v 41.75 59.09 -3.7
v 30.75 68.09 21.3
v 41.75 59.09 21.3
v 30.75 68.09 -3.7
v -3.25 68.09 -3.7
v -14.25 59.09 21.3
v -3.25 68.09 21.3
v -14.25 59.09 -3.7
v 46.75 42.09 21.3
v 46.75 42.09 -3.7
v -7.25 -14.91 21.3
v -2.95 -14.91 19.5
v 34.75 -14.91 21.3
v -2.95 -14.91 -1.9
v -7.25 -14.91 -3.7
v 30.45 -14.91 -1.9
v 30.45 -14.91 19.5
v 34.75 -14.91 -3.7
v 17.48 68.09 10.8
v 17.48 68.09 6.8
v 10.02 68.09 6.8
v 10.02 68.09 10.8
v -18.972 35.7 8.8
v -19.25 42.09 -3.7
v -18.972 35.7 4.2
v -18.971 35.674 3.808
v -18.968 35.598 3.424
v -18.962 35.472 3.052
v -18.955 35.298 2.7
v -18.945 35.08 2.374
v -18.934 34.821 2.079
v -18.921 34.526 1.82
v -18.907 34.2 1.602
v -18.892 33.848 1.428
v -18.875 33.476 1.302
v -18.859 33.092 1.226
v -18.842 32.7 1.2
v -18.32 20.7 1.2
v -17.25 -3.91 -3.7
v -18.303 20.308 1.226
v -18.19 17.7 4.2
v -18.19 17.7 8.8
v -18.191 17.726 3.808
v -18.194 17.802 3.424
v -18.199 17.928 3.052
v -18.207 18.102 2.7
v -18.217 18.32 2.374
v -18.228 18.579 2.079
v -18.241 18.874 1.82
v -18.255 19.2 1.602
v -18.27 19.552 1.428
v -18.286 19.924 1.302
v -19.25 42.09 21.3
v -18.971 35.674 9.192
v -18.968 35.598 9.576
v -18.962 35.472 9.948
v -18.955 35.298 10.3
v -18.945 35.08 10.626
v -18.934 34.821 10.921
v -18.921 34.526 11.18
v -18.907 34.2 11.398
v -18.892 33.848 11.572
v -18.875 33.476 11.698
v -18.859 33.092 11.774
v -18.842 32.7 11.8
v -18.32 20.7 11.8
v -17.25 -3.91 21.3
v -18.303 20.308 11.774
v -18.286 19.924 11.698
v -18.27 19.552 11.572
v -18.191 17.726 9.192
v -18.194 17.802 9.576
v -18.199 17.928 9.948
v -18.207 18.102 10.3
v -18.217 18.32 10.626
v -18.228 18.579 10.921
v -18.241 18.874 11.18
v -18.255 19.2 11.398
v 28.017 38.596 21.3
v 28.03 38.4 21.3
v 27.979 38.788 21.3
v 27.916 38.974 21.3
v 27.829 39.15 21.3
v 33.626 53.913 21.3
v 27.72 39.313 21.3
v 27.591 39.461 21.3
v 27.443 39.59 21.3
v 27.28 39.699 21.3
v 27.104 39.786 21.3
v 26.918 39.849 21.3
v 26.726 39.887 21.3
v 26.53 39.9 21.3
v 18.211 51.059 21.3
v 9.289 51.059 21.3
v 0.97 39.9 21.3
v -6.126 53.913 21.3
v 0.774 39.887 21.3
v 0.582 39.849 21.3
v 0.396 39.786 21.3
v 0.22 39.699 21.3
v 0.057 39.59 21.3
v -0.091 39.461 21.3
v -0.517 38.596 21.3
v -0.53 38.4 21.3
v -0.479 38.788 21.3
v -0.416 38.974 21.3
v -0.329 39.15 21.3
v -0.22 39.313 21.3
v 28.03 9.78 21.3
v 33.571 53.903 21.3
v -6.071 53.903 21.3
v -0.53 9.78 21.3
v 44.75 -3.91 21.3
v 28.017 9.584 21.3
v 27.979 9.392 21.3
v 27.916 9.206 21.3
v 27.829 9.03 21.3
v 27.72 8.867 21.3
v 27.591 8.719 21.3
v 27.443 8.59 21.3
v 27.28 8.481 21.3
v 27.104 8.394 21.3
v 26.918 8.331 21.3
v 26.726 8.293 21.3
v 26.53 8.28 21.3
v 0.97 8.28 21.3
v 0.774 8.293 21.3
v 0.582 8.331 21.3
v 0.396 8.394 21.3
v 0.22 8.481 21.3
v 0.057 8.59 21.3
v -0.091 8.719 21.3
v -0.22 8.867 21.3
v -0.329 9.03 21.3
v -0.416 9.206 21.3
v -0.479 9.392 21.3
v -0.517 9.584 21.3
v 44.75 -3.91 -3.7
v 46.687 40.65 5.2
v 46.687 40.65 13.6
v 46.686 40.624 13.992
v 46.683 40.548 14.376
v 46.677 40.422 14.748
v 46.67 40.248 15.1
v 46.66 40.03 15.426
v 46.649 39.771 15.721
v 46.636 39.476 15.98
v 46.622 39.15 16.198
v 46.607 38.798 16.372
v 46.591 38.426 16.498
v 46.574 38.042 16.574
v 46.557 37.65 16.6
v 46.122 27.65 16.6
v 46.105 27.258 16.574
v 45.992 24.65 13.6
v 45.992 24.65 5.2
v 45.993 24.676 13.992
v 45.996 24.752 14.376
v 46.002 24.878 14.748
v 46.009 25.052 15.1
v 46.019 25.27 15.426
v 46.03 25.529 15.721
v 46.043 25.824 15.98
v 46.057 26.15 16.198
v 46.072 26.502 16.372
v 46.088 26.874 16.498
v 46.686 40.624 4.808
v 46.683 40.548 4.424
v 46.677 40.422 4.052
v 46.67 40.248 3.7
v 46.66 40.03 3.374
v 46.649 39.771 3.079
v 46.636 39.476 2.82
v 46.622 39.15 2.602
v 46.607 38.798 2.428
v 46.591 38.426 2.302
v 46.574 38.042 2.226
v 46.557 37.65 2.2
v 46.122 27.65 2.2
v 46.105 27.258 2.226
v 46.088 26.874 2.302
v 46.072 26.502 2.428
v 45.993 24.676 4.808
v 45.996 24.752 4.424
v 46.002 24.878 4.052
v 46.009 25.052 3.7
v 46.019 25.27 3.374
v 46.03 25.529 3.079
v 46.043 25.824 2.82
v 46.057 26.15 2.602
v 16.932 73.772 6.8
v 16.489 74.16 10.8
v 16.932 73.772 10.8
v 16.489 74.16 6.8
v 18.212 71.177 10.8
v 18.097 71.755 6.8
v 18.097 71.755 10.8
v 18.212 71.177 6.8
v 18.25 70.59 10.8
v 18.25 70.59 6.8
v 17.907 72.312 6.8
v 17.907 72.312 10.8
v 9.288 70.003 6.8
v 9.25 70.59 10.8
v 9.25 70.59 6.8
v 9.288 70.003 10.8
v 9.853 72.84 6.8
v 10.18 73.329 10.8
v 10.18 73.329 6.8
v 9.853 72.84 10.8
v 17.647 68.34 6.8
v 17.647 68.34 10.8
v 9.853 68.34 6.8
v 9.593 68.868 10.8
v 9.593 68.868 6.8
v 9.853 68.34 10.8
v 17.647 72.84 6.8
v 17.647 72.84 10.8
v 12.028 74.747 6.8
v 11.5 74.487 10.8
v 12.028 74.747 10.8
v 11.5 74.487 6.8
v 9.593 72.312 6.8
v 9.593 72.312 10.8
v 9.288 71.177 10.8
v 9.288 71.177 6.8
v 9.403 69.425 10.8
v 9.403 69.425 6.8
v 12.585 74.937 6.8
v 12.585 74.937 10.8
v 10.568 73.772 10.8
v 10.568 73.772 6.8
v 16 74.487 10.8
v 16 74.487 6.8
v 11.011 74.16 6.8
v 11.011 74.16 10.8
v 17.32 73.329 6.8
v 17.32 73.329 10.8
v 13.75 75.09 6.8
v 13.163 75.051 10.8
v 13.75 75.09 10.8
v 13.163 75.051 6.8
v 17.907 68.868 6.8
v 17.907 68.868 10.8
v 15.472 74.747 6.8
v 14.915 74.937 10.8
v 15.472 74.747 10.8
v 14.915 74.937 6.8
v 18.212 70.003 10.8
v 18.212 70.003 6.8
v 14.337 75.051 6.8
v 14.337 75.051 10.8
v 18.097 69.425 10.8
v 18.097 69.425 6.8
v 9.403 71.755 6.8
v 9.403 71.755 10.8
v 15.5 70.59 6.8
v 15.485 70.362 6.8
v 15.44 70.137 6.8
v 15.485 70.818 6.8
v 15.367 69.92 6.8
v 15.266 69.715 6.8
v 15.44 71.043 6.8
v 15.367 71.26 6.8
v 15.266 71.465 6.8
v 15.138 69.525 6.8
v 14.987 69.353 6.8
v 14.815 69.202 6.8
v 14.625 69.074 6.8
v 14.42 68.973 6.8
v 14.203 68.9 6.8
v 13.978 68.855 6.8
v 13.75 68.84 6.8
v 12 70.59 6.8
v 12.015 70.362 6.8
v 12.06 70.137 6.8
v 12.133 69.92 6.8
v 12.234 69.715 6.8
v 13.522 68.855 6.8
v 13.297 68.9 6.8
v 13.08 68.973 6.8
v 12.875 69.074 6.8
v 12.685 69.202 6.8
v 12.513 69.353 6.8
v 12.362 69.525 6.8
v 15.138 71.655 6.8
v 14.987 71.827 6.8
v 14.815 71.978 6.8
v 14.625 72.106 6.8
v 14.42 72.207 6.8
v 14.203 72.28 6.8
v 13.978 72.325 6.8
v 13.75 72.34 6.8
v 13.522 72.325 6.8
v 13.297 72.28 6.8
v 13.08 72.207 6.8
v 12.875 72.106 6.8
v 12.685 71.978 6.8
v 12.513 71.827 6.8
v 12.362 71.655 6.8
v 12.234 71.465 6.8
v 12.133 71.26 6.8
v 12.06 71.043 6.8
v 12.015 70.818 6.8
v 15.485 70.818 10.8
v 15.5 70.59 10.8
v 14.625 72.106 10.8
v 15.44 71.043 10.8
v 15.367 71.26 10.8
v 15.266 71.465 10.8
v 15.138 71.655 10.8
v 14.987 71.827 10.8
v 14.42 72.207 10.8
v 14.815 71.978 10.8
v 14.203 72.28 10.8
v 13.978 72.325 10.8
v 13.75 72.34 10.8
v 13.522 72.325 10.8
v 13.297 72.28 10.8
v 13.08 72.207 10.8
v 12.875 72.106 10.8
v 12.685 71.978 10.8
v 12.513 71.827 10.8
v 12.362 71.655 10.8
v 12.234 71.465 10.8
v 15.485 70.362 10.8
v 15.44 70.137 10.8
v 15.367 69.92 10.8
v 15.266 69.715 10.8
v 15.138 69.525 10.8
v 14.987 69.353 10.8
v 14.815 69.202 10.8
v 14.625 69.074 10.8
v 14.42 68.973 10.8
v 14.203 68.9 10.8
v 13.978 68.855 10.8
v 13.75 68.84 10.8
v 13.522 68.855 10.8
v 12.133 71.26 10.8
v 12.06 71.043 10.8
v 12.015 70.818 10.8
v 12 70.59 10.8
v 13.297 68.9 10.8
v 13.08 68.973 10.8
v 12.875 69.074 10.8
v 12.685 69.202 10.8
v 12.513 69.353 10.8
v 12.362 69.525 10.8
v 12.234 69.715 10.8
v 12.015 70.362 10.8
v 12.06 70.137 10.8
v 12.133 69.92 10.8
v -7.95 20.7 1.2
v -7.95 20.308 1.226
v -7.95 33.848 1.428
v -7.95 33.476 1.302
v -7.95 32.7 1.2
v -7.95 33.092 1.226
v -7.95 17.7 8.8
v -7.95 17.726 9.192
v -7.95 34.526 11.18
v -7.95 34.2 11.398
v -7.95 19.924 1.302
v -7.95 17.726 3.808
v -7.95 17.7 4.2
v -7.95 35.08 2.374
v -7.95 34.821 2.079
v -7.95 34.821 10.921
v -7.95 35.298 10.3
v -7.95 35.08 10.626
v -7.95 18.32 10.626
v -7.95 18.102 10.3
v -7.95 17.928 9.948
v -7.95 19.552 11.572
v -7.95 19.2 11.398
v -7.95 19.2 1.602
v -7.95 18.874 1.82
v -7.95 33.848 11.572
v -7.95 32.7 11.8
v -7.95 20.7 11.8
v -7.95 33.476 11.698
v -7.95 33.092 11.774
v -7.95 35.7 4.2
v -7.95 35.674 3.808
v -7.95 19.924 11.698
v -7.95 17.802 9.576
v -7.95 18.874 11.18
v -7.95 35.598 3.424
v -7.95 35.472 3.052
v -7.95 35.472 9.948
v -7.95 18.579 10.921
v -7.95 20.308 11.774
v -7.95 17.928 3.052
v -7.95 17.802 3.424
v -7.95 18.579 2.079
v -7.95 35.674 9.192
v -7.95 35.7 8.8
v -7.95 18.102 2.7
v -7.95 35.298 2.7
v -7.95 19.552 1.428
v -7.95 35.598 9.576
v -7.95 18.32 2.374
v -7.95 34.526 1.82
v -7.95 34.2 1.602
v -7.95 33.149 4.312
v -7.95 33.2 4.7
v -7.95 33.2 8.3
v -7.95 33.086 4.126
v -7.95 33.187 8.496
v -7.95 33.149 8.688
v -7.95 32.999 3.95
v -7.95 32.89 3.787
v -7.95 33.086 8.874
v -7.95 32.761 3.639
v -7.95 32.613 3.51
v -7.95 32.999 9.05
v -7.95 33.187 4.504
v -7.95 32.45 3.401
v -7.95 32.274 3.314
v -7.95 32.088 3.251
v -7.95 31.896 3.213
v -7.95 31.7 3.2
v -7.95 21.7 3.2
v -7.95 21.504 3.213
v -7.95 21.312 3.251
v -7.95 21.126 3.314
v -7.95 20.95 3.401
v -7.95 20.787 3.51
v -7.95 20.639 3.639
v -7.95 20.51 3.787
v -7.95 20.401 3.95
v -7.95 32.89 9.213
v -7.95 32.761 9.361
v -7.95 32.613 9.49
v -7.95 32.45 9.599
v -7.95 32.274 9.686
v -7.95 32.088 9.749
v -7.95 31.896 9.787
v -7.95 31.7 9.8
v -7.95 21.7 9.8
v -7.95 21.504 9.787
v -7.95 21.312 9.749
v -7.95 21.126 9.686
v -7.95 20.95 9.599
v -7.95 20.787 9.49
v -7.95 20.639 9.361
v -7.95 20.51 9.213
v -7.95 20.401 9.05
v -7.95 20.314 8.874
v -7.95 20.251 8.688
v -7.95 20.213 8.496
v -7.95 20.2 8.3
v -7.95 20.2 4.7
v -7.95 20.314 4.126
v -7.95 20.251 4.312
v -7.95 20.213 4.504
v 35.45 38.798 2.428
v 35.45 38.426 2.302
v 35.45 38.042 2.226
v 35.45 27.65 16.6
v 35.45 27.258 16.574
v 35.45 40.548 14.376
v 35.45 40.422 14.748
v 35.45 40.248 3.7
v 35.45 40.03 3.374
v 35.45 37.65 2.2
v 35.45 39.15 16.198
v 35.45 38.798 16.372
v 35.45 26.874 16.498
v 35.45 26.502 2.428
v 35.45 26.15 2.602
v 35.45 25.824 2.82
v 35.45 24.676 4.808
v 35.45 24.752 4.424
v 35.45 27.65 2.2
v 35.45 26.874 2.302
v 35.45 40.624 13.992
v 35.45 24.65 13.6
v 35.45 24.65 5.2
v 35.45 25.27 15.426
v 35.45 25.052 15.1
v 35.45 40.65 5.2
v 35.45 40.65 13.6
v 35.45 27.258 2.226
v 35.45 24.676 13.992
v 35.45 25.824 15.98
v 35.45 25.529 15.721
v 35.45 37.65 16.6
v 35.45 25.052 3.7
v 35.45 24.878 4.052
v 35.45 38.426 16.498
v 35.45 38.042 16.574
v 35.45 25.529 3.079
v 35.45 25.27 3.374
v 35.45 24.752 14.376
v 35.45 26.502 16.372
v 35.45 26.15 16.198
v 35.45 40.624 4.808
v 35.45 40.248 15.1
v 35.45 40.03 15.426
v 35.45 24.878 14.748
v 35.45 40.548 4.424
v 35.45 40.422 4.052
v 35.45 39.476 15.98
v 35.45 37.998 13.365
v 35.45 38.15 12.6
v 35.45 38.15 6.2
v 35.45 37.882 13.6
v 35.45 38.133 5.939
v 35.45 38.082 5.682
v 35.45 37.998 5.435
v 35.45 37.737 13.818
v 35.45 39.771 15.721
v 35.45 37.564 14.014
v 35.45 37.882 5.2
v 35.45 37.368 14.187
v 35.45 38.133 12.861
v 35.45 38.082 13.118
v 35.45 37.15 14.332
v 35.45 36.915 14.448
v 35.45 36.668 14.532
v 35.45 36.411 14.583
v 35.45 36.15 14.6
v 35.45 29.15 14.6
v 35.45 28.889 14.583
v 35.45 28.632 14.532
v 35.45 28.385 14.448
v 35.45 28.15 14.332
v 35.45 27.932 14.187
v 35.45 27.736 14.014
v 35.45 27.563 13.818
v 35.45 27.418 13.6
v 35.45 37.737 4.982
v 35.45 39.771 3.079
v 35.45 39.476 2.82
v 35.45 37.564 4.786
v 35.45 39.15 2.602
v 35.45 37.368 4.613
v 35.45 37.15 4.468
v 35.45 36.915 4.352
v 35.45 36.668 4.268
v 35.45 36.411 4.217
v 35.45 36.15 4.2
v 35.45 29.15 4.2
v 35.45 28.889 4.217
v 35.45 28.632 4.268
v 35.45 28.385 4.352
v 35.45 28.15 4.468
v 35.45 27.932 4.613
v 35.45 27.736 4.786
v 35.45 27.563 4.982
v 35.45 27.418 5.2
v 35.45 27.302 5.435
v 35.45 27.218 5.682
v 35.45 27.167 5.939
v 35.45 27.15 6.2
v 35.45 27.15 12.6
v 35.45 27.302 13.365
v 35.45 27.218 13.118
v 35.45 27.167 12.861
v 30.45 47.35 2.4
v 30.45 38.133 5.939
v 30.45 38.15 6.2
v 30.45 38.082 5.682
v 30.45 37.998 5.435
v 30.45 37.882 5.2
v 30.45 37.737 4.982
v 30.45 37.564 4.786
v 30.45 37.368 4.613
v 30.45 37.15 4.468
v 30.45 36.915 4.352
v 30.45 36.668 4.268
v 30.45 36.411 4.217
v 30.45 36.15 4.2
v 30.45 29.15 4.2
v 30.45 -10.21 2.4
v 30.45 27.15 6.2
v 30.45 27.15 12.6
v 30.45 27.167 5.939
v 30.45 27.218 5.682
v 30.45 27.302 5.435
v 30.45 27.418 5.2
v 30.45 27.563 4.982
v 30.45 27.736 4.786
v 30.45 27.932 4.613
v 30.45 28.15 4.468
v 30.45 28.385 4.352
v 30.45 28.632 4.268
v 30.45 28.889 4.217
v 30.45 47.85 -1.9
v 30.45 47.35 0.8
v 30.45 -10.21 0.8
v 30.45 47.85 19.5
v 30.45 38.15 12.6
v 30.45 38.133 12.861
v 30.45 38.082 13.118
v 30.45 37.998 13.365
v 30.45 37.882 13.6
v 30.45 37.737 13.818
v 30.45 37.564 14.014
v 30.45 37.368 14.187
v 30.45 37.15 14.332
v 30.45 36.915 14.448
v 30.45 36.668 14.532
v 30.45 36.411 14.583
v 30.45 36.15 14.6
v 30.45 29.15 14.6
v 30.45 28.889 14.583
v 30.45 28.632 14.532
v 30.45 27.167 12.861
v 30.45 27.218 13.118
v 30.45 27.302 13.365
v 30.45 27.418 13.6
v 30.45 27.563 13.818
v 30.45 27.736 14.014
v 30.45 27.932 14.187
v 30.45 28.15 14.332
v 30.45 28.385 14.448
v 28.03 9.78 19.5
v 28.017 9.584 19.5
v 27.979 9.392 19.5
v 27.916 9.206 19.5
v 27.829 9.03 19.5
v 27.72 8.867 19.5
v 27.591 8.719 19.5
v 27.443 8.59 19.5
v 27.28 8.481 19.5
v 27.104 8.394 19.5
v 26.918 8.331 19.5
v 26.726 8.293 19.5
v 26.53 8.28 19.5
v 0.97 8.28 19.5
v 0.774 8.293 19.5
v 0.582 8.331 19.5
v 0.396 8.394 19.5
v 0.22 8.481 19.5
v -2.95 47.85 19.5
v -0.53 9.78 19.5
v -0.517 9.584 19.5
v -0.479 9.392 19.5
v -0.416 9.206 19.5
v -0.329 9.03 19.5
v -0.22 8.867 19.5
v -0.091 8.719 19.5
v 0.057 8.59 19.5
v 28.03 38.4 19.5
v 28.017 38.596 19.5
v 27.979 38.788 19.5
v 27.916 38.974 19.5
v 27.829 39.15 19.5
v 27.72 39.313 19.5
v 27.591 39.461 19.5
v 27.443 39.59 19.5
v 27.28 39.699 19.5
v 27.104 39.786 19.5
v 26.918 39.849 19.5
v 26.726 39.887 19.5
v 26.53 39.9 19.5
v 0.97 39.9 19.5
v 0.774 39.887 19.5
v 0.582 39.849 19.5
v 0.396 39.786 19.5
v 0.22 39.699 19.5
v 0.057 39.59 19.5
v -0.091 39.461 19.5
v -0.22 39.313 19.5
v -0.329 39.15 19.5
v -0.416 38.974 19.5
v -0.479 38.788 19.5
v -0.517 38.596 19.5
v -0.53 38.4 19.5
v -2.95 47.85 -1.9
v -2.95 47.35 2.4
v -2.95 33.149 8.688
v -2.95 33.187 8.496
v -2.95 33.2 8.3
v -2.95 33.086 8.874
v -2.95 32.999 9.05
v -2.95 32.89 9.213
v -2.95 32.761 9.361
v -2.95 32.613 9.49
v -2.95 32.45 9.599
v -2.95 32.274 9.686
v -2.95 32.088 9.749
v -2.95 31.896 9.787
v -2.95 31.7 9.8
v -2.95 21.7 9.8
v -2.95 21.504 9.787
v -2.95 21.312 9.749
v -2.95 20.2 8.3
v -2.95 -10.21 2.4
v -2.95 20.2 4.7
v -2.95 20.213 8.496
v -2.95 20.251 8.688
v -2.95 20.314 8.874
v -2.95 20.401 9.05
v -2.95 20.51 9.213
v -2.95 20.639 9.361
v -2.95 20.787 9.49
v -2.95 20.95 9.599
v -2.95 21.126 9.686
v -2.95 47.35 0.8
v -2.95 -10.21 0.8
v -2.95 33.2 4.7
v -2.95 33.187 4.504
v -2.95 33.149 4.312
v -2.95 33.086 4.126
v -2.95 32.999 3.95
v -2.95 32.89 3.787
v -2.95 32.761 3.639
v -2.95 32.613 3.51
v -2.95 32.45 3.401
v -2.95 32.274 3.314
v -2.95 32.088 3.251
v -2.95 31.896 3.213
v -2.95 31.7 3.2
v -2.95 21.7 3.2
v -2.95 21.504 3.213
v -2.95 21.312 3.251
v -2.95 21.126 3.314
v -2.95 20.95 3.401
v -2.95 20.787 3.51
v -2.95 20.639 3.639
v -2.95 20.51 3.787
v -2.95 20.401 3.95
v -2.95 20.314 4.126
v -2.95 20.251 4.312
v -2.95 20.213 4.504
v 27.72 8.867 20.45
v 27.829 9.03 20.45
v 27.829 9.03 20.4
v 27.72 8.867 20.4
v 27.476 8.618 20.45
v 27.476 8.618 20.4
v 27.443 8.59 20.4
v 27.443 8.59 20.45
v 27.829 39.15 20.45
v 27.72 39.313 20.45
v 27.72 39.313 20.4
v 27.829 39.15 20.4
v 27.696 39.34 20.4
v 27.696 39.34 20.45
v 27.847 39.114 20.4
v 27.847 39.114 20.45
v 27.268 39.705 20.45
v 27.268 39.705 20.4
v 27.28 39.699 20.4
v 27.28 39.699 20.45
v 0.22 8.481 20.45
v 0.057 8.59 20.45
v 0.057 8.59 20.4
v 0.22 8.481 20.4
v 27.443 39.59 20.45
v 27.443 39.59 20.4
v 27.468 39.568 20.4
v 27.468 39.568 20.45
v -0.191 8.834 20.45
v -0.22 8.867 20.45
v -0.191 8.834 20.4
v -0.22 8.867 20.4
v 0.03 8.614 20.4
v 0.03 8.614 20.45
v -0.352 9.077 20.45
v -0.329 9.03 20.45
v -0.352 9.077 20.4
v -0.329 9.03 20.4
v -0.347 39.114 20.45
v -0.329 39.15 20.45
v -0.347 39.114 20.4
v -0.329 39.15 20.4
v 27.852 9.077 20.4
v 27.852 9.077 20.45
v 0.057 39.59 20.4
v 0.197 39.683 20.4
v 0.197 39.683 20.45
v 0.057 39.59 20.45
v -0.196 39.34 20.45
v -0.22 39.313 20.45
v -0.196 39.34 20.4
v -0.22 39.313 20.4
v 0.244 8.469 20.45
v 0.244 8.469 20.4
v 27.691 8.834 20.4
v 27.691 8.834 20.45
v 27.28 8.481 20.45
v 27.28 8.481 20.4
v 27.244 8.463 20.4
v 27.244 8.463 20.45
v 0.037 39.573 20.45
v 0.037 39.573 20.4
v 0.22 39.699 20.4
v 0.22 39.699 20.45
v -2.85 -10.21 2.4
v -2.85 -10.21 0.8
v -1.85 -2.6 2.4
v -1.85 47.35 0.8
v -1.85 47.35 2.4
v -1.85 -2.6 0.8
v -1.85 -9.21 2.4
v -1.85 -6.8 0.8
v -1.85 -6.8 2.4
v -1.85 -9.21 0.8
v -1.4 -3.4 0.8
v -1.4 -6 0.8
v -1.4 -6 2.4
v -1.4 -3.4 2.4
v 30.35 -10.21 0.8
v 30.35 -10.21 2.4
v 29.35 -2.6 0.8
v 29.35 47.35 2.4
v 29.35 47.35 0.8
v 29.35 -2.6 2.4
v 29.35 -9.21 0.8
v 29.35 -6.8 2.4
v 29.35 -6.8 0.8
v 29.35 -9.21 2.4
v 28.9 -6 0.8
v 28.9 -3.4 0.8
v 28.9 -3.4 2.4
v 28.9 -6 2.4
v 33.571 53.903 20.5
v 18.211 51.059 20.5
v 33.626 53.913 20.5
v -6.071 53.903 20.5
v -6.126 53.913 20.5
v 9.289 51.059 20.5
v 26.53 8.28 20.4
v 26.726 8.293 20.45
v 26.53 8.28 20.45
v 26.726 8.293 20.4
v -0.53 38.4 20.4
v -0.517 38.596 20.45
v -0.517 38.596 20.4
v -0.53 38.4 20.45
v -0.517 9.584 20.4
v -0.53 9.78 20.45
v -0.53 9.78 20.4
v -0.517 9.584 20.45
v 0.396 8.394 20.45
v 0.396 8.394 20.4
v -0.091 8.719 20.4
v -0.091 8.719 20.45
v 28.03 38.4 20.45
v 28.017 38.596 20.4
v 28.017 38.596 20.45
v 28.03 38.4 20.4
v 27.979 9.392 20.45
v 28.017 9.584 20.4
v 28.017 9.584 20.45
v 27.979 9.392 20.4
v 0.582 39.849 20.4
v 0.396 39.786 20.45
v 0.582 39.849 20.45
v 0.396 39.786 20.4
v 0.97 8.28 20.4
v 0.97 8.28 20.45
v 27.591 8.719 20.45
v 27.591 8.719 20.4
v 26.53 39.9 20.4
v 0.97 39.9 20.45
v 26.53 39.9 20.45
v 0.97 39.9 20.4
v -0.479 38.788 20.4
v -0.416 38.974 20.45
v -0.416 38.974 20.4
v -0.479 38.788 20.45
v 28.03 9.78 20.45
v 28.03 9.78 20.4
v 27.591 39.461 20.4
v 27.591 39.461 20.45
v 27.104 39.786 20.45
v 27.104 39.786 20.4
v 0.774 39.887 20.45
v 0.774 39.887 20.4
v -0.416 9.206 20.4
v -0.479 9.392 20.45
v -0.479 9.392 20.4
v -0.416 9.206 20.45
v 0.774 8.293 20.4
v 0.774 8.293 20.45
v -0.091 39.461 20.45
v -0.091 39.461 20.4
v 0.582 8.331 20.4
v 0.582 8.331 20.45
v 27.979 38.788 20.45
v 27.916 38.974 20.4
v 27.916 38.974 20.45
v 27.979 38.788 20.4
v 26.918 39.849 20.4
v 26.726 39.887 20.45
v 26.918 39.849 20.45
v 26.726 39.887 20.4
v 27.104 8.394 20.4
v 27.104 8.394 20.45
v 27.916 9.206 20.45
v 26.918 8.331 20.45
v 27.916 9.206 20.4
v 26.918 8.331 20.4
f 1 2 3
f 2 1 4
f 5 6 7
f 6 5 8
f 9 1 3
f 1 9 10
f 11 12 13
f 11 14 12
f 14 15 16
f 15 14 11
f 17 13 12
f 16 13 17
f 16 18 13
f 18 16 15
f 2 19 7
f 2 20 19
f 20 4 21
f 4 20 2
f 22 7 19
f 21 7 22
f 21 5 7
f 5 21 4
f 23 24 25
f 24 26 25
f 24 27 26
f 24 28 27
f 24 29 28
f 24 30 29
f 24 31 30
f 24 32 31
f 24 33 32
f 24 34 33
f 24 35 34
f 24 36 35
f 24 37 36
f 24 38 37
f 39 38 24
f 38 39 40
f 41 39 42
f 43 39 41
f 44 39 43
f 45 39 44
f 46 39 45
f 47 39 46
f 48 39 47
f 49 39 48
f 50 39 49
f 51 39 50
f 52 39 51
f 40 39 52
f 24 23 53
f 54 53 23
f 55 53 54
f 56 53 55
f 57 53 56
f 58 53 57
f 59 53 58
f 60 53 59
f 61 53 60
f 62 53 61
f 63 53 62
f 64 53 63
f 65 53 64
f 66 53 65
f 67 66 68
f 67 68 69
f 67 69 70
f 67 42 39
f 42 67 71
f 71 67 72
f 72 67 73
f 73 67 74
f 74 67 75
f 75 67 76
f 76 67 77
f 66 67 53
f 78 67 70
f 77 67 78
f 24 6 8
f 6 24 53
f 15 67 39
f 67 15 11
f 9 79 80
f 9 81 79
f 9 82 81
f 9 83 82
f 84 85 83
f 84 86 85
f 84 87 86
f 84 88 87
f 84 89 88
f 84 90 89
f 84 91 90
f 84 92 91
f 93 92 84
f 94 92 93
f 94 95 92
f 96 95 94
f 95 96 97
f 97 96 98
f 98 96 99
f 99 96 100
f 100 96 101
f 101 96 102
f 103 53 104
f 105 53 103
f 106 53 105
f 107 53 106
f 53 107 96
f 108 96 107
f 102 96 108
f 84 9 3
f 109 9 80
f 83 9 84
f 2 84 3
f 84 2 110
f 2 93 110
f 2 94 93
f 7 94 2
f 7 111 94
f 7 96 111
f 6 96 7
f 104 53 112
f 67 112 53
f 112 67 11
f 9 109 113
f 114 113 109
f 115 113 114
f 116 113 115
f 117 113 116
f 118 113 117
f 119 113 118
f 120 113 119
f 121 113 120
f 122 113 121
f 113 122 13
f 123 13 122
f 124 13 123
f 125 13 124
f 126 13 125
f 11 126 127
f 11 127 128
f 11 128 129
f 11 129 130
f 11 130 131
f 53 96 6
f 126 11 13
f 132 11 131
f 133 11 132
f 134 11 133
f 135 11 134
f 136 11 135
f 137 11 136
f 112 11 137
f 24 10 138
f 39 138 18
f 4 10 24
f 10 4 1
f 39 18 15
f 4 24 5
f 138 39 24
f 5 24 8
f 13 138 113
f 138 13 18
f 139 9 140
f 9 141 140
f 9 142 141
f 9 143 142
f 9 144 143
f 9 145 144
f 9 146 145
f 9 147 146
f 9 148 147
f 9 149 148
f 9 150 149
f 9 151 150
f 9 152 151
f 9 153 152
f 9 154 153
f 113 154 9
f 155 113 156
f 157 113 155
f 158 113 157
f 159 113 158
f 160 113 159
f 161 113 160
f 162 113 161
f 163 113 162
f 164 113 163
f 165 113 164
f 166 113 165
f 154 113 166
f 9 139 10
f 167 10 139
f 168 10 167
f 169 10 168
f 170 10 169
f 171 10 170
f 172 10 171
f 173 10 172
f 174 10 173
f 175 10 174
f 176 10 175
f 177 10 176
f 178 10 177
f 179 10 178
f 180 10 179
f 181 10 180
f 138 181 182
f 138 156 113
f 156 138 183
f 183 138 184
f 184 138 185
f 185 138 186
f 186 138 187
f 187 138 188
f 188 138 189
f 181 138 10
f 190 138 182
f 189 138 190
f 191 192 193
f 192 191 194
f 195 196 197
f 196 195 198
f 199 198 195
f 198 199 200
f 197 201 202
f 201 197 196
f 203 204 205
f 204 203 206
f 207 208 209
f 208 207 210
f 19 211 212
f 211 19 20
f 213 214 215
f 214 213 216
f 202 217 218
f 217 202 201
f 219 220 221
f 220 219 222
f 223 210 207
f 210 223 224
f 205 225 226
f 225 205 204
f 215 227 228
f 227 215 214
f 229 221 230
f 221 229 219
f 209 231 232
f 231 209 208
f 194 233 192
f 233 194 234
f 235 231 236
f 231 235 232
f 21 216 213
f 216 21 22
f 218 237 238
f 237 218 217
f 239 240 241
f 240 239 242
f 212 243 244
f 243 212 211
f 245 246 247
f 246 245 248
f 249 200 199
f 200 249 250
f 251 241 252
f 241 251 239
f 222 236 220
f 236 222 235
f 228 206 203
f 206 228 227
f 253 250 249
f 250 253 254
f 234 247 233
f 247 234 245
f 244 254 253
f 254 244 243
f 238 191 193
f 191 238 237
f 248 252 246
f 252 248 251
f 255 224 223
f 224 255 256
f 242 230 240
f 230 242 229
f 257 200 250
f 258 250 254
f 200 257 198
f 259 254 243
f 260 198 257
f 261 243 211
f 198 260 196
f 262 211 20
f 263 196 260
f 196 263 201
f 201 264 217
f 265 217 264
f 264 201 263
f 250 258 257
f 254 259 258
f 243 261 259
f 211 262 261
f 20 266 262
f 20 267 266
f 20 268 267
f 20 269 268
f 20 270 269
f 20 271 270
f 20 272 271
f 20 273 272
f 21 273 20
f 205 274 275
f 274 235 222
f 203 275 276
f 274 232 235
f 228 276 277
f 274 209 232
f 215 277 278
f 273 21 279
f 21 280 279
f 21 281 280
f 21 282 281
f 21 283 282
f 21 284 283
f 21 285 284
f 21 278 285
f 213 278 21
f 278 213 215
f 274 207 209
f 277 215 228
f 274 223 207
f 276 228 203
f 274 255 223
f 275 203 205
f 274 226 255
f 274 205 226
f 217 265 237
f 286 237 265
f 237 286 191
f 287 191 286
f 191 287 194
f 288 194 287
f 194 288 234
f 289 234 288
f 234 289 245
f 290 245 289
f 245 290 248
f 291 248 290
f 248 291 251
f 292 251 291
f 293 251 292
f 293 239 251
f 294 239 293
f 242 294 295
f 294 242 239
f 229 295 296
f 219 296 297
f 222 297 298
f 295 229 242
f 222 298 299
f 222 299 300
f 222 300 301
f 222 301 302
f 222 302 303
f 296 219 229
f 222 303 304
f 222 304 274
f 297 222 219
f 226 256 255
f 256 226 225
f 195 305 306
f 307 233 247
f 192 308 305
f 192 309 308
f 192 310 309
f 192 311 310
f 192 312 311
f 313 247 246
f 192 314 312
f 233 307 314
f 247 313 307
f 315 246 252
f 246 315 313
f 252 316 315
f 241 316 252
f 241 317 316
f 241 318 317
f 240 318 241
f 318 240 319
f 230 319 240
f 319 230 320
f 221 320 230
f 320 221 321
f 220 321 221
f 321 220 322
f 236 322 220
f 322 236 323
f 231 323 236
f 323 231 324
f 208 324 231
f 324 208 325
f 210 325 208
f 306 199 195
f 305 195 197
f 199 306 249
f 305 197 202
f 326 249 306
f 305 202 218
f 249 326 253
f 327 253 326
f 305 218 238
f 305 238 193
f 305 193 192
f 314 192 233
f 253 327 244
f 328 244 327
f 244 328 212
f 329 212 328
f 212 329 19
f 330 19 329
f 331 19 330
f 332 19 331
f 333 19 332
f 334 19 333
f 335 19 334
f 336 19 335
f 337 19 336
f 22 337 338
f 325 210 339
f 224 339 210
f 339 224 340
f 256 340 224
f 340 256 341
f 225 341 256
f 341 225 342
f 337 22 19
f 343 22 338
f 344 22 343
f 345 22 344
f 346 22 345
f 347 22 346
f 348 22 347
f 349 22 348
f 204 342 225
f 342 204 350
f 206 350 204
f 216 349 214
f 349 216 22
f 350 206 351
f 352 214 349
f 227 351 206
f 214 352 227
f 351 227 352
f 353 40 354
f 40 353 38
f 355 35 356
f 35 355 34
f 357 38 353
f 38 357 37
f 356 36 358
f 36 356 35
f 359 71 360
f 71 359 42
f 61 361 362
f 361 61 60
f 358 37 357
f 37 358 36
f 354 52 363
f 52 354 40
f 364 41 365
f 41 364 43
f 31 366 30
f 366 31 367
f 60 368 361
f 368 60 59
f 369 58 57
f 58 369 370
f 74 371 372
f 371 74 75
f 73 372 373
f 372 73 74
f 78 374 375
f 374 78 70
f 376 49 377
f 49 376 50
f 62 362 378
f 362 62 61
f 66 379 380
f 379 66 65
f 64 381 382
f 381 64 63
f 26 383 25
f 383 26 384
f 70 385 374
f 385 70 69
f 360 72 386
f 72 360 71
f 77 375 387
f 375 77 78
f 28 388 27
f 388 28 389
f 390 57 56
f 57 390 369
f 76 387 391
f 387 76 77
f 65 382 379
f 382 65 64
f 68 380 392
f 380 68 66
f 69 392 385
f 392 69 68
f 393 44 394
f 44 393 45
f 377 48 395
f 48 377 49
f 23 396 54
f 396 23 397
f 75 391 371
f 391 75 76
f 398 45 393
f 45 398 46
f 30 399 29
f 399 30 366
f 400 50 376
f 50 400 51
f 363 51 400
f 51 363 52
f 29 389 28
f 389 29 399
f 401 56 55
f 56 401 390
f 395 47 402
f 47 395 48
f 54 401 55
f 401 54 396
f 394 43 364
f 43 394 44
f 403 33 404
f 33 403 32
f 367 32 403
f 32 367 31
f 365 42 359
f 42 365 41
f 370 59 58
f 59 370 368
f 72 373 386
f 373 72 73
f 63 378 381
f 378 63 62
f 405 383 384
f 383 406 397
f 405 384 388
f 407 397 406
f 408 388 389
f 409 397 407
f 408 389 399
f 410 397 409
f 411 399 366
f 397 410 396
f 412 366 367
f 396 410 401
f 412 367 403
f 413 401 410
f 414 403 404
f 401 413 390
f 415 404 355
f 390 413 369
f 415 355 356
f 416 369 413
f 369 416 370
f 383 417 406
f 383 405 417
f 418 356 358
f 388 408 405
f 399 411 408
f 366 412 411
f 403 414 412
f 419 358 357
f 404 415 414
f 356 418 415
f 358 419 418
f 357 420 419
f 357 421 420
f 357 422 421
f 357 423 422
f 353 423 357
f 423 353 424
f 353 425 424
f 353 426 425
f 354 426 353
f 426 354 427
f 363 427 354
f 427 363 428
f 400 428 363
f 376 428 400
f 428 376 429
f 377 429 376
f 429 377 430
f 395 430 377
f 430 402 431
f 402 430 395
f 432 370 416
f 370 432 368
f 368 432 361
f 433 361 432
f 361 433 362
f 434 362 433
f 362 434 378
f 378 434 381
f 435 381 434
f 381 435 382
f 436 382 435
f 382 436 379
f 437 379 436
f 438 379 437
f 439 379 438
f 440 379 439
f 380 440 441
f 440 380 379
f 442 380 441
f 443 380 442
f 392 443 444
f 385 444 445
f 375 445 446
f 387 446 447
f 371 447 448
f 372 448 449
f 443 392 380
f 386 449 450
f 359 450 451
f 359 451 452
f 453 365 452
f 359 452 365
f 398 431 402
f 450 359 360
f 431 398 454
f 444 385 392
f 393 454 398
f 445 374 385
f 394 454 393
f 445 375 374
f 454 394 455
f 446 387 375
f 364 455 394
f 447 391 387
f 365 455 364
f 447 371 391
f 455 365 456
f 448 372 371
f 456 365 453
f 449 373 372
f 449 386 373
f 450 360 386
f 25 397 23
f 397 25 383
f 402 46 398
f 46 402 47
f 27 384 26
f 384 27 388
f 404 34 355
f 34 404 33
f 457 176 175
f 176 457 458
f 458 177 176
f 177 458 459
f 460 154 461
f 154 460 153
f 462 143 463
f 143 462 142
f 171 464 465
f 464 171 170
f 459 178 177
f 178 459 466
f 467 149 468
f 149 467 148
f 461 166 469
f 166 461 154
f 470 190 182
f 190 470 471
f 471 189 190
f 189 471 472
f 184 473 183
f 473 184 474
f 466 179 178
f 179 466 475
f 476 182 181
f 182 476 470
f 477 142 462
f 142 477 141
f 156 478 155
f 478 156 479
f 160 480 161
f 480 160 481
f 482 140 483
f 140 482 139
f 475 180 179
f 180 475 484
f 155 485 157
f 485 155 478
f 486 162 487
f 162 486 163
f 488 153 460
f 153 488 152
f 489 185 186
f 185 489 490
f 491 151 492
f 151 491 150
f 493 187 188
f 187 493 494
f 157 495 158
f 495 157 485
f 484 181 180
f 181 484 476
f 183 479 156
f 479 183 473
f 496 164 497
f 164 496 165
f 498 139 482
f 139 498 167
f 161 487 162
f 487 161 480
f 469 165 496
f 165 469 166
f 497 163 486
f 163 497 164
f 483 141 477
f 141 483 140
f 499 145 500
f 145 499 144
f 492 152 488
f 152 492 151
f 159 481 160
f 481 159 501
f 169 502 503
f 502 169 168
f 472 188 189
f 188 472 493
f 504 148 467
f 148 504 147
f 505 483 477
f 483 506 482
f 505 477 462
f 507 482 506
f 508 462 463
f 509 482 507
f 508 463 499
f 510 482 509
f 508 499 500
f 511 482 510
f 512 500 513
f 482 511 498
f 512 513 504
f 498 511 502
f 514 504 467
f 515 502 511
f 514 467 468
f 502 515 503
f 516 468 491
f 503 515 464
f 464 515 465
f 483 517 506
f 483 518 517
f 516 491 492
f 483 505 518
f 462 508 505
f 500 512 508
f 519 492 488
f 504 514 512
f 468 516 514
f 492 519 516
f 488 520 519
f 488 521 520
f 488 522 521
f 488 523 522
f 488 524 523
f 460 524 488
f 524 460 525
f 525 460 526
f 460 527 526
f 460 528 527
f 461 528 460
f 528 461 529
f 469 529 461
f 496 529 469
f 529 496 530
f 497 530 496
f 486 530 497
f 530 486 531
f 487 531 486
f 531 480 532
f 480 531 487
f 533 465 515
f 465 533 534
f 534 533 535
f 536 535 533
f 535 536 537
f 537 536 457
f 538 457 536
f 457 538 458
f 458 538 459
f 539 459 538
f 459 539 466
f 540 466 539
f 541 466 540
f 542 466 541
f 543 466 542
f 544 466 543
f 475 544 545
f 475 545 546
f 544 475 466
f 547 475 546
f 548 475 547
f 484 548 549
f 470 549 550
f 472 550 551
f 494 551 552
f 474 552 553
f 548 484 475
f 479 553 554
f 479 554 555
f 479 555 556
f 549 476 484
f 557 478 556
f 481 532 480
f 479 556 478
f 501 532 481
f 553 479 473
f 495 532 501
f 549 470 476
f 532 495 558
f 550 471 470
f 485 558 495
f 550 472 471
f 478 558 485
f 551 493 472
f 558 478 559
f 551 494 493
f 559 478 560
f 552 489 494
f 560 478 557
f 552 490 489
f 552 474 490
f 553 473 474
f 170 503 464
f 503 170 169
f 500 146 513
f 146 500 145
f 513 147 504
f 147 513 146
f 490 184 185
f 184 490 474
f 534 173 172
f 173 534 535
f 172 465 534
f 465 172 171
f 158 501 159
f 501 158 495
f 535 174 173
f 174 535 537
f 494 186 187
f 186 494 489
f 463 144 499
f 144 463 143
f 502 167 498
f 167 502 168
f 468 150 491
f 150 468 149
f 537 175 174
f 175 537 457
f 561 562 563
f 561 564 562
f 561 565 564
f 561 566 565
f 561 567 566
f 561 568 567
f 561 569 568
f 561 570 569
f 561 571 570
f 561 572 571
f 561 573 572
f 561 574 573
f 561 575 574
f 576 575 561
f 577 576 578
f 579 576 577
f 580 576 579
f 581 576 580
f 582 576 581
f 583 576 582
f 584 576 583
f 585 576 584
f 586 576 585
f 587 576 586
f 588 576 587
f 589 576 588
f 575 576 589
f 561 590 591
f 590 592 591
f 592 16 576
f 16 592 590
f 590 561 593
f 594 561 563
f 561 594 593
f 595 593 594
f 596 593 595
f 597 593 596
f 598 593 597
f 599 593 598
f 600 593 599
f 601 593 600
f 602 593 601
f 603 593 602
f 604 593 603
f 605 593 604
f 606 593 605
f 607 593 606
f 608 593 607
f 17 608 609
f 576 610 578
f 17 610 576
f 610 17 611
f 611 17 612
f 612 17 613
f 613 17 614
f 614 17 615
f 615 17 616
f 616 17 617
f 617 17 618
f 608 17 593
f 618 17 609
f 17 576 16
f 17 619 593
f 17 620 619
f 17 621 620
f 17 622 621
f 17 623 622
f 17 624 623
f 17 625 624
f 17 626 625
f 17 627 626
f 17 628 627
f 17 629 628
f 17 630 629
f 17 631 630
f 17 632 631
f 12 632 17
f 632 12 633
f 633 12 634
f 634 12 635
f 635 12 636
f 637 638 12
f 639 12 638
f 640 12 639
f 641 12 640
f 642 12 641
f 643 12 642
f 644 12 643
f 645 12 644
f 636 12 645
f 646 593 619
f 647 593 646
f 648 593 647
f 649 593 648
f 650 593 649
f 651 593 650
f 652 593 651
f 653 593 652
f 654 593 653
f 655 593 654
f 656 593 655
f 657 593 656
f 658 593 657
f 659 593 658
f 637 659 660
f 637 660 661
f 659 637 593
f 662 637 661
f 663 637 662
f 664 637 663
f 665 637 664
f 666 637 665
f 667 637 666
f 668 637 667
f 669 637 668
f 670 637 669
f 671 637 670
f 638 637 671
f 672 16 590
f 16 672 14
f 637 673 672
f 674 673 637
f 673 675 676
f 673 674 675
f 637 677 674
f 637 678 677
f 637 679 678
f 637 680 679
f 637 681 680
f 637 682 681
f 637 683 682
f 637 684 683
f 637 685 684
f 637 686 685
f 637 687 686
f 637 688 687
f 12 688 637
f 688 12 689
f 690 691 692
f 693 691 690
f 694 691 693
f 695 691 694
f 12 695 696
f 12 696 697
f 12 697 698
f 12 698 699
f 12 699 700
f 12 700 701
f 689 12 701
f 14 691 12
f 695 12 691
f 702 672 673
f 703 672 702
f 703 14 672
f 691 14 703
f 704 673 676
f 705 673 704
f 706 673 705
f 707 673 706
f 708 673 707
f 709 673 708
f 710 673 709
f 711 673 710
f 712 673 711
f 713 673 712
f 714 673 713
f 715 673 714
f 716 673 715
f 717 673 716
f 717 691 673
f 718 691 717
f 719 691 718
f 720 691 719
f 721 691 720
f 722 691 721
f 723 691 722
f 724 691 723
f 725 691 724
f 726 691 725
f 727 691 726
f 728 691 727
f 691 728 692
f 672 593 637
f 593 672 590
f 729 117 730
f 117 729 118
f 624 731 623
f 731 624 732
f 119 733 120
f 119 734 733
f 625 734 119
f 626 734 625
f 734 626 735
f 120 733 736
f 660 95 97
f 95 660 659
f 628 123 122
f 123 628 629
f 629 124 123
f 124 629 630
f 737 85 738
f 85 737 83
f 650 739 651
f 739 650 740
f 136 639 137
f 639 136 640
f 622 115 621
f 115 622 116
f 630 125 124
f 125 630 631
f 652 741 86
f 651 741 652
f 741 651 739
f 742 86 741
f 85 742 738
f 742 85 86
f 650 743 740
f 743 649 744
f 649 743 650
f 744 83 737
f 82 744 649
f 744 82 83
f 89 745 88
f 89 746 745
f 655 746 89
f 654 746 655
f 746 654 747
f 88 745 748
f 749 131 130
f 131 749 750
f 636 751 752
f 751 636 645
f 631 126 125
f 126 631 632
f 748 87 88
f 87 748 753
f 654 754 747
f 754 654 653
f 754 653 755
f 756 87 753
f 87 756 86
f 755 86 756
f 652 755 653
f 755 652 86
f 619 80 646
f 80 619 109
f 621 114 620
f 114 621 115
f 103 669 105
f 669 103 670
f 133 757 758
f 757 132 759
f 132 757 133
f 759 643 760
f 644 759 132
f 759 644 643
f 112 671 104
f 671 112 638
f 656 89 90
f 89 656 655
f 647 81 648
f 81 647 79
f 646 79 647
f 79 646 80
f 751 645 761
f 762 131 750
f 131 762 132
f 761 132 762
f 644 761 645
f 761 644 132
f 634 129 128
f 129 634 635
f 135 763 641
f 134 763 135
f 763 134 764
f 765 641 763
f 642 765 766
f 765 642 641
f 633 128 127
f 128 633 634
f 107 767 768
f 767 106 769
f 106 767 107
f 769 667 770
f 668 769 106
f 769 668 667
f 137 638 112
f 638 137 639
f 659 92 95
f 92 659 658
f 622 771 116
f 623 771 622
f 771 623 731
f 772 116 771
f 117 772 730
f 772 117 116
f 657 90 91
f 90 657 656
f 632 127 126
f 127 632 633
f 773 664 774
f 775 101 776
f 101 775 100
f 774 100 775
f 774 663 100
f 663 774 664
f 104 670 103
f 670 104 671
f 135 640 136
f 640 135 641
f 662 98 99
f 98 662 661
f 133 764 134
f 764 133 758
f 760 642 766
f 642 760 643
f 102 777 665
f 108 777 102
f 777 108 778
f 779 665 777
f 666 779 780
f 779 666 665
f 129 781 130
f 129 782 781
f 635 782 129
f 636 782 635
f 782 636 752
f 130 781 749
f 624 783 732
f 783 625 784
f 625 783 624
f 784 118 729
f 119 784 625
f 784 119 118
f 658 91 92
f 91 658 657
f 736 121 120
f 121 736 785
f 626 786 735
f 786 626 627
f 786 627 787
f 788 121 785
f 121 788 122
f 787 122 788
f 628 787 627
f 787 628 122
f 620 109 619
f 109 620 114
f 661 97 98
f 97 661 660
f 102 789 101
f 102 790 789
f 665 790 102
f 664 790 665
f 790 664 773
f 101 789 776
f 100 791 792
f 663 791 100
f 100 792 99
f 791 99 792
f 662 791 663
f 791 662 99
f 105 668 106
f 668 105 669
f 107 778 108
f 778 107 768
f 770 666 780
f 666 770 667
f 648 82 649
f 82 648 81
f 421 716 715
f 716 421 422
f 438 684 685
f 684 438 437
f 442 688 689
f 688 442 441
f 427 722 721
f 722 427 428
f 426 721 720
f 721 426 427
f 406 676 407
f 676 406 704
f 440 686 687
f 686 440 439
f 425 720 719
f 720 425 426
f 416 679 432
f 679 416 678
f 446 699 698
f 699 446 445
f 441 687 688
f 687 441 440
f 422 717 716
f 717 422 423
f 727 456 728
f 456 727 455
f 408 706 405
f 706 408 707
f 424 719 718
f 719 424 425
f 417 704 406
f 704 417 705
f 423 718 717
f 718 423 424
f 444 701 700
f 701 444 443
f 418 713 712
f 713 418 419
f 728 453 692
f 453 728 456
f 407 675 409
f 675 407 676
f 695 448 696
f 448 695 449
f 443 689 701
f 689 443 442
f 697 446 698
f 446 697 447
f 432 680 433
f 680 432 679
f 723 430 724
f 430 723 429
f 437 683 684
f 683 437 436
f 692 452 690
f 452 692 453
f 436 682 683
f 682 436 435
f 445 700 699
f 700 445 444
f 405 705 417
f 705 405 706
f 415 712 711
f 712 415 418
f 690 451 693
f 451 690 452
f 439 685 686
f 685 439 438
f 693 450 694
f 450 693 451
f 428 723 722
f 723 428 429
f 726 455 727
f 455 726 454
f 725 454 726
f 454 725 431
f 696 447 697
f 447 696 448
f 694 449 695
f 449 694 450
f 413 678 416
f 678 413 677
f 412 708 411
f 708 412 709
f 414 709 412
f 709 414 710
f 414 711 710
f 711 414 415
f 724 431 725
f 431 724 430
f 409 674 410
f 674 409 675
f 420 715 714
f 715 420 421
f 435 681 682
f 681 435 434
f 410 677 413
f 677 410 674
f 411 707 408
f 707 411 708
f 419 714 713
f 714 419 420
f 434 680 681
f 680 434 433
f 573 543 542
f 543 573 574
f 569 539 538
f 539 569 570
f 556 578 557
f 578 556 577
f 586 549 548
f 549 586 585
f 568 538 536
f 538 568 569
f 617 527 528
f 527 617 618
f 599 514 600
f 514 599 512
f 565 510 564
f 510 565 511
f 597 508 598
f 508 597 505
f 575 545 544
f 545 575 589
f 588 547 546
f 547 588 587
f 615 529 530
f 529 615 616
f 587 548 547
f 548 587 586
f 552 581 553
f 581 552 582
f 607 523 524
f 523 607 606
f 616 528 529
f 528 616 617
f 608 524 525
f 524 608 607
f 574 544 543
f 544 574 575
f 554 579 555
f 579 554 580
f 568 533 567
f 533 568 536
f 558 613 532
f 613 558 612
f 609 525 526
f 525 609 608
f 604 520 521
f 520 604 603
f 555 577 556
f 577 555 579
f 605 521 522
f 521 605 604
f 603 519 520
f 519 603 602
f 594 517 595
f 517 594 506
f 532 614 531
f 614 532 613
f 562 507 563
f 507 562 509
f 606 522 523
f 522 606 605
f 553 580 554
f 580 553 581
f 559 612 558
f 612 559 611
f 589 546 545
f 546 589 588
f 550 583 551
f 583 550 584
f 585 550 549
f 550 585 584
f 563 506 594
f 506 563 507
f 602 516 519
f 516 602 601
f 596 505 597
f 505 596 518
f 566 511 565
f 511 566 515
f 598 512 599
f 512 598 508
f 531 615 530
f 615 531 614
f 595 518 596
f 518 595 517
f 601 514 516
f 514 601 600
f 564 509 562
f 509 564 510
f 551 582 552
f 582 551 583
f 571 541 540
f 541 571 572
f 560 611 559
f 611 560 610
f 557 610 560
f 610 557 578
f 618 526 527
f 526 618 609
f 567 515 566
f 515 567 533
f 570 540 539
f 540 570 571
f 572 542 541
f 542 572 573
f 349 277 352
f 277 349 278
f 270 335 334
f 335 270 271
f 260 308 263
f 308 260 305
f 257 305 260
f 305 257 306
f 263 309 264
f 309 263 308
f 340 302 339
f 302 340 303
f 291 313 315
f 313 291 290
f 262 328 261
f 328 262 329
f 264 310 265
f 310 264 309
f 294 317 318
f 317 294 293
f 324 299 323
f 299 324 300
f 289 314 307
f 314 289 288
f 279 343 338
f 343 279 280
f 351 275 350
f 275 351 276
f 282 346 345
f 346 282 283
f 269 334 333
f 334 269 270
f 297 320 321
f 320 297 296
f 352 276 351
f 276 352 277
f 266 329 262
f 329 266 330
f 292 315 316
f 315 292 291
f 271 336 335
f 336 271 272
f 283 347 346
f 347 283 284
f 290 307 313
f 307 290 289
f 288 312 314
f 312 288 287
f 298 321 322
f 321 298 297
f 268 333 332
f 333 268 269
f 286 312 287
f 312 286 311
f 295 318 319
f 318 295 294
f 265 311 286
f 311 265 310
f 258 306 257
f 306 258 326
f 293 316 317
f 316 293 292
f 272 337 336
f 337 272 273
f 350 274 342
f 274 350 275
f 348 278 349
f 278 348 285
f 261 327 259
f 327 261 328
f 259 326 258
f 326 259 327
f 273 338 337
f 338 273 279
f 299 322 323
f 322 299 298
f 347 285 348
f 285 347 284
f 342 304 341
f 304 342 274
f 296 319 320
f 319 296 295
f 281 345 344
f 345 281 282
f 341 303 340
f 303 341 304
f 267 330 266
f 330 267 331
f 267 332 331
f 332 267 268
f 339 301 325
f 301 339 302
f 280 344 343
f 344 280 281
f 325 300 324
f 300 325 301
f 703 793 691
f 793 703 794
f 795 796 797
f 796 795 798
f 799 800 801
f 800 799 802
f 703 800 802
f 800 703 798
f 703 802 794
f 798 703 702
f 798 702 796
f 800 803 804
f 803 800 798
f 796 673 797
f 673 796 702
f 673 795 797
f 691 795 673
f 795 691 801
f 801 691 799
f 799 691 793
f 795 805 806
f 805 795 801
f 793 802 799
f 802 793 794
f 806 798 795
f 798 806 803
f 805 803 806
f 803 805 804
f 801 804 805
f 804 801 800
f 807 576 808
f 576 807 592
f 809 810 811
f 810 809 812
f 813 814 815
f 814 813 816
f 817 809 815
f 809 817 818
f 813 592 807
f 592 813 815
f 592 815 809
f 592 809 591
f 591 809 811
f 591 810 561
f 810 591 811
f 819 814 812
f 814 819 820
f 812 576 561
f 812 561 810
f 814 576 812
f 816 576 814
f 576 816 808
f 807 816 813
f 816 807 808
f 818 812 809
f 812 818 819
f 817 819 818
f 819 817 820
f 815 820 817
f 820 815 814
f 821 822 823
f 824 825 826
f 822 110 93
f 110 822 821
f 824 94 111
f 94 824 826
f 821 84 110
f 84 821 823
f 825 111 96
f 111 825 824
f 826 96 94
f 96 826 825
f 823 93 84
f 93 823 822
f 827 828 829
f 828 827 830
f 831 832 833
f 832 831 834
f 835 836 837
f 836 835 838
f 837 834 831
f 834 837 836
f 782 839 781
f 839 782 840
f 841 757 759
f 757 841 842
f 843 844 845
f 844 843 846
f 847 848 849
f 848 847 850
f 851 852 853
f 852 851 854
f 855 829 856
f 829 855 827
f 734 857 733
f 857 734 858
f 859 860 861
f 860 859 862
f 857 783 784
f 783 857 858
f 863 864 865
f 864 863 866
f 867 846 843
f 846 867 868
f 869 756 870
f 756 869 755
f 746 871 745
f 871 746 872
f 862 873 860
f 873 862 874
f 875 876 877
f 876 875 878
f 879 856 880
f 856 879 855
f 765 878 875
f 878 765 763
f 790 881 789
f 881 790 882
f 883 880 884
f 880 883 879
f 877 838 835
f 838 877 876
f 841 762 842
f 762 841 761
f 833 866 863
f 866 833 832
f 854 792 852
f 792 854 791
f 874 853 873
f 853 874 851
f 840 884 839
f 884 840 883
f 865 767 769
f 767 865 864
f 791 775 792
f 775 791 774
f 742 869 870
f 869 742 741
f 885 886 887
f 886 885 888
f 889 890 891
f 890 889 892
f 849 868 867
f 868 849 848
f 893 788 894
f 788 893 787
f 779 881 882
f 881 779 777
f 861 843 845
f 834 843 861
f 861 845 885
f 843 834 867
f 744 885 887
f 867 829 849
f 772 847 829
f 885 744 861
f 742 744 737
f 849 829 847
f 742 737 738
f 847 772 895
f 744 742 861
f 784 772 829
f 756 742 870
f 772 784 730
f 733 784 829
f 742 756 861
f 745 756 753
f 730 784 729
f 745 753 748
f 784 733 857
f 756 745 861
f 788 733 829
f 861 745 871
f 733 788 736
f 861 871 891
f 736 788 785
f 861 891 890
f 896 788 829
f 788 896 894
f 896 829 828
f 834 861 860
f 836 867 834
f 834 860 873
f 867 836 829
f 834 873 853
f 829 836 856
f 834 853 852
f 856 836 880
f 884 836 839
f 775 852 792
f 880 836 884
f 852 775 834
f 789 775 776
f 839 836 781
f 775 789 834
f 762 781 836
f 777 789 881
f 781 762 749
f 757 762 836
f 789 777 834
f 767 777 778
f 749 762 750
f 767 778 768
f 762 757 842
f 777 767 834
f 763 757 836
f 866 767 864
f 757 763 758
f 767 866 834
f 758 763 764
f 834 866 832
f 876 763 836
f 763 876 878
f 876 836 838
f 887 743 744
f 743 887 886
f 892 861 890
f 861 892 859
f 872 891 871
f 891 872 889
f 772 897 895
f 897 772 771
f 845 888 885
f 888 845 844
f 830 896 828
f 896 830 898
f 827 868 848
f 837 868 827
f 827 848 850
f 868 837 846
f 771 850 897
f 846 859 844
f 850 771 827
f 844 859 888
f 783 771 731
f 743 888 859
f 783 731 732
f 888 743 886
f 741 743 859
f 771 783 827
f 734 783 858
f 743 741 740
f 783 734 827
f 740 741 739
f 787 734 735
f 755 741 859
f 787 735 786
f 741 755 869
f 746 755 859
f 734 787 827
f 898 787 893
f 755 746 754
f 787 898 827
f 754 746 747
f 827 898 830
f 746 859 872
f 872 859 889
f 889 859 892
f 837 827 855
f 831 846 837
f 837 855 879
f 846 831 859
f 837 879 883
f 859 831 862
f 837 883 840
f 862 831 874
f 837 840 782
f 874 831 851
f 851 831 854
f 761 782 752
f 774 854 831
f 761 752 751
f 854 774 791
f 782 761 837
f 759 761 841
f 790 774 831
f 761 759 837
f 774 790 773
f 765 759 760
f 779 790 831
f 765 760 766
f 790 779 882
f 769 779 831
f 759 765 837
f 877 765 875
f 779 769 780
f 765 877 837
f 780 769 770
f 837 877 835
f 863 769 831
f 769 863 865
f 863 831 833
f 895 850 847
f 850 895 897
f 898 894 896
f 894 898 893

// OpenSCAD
// V2c: V2b plus ice-blue eye lenses and a matching reactor frame.
// Retains V2's complete Iron Man sleeve geometry; replaces only the front colour layout.
// part: ironman_v2c | body/gold/black/cyan[_print] | check_core/colours/backing/baseline
include <xmas_orn_outers_v2.scad>
part = "ironman_v2c";
preview_display = true;
fresh_names = ["body", "gold", "black", "cyan"];
fresh_colours = ["#a91f2c", "#e4b44f", "#24232b", "#70e2ff"];

module fresh_reactor() polygon([[-24,23],[24,23],[17,-16],[-17,-16]]);
module fresh_gold() v2_bilateral() {
    // Small angular shoulder plates and narrow armour at the sides of the display.
    polygon([[13,42],[17,43],[24,37],[27,29],[22,30],[18,37]]);
    polygon([[28,19],[30,17],[29,-16],[22,-28],[20,-27],[25,-15]]);
}
module fresh_eyes() v2_bilateral() polygon([
    [-19,33],[-5.5,30.5],[-7,28],[-18,29]]);
module fresh_black() {
    offset(delta=1.2) fresh_reactor();
    offset(delta=0.65) fresh_eyes();
}
// The reactor and both eye lenses use a single ice-blue filament (four colours total).
module fresh_cyan() {
    difference() { fresh_reactor(); offset(delta=-1.5) fresh_reactor(); }
    fresh_eyes();
}
module fresh_raw(c) {
    if (c == 1) fresh_gold();
    if (c == 2) fresh_black();
    if (c == 3) fresh_cyan();
}
module fresh_ink(c) difference() {
    intersection() { v2_outline(2); fresh_raw(c); }
    if (c < 3) for (k = [c+1:3]) fresh_raw(k);
}
module fresh_body() difference() {
    // Reunite the V2 body and its inlays, then cut the new inlay pockets.
    // This keeps its outline, loop, rails, pocket, detents and openings exactly.
    v2_solid(2);
    translate([v2_cx,v2_cy,sz1-inlay_d]) linear_extrude(inlay_d+eps)
        for (c = [1:3]) fresh_raw(c);
}
module fresh_colour(c) difference() {
    translate([v2_cx,v2_cy,sz1-inlay_d]) linear_extrude(inlay_d) fresh_ink(c);
    sleeve_cuts(ext=40, finger=true);
}
module fresh_piece(c) { if (c == 0) fresh_body(); else fresh_colour(c); }
module fresh_solid() union() for (c = [0:3]) fresh_piece(c);

if (part == "ironman_v2c") {
    for (c = [0:3]) color(fresh_colours[c]) render() fresh_piece(c);
    if (preview_display) color("#101a25") translate([v2_cx,v2_cy,sz1-inlay_d-0.1])
        linear_extrude(0.05) v2_window();
}
for (c = [0:3]) {
    if (part == fresh_names[c]) fresh_piece(c);
    if (part == str(fresh_names[c],"_print")) v2_stand(2) fresh_piece(c);
}
if (part == "check_core") intersection() { fresh_solid(); union() { core_tray(); core_bezel(); } }
if (part == "check_colours") for (a = [0:2], b = [a+1:3])
    intersection() { fresh_piece(a); fresh_piece(b); }
if (part == "check_backing") difference() {
    translate([0,0,-inlay_d]) union() for (c = [1:3]) fresh_colour(c);
    fresh_body();
}
if (part == "check_baseline") {
    difference() { fresh_solid(); v2_solid(2); }
    difference() { v2_solid(2); fresh_solid(); }
}
